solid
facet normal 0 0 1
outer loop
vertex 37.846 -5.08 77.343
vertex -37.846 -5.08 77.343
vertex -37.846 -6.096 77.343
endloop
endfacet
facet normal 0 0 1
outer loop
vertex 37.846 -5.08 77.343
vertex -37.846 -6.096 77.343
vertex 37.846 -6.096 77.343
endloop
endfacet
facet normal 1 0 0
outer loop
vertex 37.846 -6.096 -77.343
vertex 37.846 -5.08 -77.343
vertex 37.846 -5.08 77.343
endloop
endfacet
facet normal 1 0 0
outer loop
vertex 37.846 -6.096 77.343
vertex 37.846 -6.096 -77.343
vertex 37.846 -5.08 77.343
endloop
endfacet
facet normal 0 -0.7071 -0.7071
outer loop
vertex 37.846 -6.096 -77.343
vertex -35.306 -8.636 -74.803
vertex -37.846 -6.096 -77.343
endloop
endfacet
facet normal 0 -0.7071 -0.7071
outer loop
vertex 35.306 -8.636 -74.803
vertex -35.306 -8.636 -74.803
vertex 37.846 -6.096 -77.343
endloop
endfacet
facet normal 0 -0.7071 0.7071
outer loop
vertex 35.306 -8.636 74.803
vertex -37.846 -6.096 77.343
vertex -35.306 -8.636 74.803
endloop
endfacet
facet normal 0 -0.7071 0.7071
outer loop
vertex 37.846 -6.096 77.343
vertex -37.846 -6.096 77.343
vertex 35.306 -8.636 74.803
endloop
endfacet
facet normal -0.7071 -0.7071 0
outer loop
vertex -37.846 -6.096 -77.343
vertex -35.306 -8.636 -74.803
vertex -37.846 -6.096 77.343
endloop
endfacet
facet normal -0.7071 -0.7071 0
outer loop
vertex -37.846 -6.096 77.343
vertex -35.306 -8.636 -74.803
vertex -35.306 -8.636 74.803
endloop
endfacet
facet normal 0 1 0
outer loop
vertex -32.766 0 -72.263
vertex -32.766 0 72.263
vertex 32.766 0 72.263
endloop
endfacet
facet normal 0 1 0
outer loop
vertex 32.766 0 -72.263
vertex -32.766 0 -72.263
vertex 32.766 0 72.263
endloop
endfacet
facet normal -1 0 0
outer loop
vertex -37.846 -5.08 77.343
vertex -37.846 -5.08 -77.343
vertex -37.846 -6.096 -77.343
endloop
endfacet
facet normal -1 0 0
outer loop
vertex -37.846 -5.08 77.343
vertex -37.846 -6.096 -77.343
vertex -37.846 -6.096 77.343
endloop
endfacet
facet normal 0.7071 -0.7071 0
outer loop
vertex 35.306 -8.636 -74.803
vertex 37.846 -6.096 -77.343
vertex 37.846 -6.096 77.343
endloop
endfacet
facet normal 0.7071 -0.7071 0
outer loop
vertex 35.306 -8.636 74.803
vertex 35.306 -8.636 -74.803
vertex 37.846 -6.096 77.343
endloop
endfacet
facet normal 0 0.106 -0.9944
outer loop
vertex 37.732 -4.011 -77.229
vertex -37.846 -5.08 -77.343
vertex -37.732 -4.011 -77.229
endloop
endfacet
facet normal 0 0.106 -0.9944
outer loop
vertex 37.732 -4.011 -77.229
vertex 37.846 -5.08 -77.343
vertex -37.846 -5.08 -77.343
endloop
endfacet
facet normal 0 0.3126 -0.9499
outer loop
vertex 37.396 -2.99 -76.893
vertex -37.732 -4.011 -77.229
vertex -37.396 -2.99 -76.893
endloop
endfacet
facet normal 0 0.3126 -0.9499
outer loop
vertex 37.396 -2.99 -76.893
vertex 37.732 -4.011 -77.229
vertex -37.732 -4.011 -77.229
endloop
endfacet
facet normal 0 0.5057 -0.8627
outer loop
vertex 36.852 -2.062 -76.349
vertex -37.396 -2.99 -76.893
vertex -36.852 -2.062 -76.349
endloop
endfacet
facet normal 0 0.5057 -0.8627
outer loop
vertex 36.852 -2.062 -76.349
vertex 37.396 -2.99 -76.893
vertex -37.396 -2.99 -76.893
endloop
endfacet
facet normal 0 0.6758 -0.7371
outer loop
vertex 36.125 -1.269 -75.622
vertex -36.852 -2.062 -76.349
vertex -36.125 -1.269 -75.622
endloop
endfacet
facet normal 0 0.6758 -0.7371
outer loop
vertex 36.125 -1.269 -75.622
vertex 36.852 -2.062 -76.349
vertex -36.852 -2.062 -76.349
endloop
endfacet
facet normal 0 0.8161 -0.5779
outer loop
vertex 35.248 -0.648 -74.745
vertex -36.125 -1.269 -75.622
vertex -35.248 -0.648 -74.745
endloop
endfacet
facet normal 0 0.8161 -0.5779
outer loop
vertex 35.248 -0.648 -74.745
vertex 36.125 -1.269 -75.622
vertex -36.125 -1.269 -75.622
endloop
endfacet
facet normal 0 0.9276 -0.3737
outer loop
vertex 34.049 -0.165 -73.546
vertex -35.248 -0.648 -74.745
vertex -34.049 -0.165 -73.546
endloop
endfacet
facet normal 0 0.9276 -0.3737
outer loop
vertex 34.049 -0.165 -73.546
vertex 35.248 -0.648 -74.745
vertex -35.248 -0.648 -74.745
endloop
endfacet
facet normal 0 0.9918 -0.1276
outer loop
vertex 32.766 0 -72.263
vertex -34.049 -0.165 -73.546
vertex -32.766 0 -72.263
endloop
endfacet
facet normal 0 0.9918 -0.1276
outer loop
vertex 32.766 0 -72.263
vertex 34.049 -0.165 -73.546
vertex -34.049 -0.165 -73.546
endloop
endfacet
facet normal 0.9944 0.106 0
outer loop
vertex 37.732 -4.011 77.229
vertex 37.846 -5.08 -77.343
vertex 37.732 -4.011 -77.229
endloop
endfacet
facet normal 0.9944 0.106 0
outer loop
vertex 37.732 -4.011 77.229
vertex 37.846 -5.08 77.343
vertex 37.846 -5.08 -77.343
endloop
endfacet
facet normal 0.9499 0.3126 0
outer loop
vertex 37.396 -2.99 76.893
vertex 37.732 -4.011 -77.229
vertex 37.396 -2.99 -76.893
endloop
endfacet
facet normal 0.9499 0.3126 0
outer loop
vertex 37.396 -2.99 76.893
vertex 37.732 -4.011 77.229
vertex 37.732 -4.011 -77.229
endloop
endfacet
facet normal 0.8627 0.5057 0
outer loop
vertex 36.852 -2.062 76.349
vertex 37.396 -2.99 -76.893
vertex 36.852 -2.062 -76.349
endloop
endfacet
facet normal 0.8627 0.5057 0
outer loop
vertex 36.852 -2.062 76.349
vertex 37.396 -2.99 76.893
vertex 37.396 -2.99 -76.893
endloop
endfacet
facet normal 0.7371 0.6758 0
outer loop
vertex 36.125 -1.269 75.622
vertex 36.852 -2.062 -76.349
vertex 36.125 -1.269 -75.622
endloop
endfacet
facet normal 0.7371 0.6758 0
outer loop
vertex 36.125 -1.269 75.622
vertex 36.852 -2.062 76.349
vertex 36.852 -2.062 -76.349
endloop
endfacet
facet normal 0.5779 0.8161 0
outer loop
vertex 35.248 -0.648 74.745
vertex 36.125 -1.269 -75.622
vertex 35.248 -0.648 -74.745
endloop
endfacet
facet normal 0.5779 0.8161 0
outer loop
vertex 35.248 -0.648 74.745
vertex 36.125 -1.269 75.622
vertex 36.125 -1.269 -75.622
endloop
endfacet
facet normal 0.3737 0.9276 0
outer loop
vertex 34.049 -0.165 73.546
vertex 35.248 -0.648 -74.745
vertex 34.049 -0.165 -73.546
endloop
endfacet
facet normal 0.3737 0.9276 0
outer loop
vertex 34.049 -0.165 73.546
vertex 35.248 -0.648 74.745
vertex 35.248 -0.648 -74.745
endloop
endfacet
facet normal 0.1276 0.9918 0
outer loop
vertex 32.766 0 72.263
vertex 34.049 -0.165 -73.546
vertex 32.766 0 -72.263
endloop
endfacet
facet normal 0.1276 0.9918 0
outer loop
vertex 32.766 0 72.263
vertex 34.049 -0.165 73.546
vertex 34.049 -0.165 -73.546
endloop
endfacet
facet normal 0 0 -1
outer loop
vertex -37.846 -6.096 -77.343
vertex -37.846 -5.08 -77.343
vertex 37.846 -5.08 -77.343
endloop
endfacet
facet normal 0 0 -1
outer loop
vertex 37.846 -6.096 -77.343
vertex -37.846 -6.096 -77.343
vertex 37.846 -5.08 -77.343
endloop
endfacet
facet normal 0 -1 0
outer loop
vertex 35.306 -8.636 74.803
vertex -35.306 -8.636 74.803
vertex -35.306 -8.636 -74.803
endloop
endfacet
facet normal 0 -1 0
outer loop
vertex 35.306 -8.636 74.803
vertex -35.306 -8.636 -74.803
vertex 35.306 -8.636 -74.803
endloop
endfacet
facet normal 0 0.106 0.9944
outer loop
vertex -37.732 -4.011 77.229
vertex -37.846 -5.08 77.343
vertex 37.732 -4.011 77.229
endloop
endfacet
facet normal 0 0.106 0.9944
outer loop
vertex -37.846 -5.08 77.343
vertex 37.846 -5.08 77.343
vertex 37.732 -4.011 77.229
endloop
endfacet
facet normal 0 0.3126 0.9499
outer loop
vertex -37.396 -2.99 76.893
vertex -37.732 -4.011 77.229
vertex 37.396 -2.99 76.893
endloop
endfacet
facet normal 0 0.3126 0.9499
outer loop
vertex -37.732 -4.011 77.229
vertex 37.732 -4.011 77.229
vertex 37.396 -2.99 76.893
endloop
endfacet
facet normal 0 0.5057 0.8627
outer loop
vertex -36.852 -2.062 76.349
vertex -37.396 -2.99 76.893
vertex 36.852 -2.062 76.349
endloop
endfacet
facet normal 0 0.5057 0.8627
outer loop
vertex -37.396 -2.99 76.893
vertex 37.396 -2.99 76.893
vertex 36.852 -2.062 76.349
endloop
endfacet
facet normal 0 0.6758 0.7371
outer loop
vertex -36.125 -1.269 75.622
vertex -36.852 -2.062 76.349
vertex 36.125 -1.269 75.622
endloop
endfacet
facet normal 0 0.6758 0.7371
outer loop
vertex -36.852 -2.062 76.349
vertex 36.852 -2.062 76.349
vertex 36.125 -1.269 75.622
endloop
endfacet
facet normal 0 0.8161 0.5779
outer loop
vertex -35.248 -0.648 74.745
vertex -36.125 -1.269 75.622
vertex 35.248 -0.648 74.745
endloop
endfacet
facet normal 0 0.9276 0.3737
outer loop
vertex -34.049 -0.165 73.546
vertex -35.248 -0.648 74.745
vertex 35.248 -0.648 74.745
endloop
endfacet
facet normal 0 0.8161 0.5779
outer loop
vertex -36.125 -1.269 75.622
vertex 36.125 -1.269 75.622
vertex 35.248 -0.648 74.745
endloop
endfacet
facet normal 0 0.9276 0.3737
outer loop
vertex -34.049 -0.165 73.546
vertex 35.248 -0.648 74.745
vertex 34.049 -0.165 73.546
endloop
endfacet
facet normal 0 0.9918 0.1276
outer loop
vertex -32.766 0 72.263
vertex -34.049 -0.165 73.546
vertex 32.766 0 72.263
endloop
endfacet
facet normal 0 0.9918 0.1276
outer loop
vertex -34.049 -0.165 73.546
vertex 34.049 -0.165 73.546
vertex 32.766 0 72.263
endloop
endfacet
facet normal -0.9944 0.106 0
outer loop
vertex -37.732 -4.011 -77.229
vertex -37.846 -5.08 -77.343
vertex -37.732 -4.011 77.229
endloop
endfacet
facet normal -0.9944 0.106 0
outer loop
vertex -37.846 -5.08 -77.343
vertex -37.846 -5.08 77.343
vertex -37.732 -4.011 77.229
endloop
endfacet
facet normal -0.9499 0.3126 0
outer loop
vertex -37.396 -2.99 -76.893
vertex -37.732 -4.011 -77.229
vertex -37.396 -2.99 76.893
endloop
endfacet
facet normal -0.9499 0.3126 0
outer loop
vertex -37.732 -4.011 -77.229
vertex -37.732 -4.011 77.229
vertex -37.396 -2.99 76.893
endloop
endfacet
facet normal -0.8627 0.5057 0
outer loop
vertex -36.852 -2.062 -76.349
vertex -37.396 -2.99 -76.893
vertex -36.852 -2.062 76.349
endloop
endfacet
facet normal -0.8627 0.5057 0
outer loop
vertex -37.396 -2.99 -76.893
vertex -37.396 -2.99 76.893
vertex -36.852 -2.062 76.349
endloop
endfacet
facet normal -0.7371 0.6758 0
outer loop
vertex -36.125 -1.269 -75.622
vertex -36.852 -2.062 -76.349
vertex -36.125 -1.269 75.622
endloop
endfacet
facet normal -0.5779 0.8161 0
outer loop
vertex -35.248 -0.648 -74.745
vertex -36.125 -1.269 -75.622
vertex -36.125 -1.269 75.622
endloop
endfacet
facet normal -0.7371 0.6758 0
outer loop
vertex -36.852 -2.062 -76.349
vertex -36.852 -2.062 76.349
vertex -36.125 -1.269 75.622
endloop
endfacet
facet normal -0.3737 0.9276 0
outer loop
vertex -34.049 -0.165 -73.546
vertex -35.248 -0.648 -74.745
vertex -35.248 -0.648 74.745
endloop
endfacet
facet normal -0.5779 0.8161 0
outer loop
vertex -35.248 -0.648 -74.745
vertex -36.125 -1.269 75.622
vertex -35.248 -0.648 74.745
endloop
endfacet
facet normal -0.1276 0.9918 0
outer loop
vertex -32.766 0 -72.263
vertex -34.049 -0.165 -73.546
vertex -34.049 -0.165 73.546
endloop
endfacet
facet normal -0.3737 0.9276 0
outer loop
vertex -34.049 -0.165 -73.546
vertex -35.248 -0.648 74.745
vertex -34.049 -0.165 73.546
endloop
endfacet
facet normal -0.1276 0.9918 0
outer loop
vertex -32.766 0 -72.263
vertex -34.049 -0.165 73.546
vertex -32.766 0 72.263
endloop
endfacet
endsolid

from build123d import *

# Parameters (mm, degrees)
F0_W     = 75.692
F0_H     = 154.686
F1_DEPTH = 8.636
F2_R     = 5.08
F3_SIZE  = 2.54


with BuildPart() as f1:
    # F0 (on Front) → F1 (new body)
    with BuildSketch(Plane.XZ):
        Rectangle(F0_W, F0_H)
    extrude(amount=F1_DEPTH)

    # F2
    f2_edges = [f1.edges().sort_by_distance(p)[0] for p in [
        (37.846, 0, 0),
        (0, 0, 77.343),
        (-37.846, 0, 0),
        (0, 0, -77.343),
    ]]
    fillet(f2_edges, radius=F2_R)

    # F3
    f3_edges = [f1.edges().sort_by_distance(p)[0] for p in [
        (0, -8.636, 77.343),
        (-37.846, -8.636, 0),
        (0, -8.636, -77.343),
        (37.846, -8.636, 0),
    ]]
    chamfer(f3_edges, length=F3_SIZE)


solid = f1.part
